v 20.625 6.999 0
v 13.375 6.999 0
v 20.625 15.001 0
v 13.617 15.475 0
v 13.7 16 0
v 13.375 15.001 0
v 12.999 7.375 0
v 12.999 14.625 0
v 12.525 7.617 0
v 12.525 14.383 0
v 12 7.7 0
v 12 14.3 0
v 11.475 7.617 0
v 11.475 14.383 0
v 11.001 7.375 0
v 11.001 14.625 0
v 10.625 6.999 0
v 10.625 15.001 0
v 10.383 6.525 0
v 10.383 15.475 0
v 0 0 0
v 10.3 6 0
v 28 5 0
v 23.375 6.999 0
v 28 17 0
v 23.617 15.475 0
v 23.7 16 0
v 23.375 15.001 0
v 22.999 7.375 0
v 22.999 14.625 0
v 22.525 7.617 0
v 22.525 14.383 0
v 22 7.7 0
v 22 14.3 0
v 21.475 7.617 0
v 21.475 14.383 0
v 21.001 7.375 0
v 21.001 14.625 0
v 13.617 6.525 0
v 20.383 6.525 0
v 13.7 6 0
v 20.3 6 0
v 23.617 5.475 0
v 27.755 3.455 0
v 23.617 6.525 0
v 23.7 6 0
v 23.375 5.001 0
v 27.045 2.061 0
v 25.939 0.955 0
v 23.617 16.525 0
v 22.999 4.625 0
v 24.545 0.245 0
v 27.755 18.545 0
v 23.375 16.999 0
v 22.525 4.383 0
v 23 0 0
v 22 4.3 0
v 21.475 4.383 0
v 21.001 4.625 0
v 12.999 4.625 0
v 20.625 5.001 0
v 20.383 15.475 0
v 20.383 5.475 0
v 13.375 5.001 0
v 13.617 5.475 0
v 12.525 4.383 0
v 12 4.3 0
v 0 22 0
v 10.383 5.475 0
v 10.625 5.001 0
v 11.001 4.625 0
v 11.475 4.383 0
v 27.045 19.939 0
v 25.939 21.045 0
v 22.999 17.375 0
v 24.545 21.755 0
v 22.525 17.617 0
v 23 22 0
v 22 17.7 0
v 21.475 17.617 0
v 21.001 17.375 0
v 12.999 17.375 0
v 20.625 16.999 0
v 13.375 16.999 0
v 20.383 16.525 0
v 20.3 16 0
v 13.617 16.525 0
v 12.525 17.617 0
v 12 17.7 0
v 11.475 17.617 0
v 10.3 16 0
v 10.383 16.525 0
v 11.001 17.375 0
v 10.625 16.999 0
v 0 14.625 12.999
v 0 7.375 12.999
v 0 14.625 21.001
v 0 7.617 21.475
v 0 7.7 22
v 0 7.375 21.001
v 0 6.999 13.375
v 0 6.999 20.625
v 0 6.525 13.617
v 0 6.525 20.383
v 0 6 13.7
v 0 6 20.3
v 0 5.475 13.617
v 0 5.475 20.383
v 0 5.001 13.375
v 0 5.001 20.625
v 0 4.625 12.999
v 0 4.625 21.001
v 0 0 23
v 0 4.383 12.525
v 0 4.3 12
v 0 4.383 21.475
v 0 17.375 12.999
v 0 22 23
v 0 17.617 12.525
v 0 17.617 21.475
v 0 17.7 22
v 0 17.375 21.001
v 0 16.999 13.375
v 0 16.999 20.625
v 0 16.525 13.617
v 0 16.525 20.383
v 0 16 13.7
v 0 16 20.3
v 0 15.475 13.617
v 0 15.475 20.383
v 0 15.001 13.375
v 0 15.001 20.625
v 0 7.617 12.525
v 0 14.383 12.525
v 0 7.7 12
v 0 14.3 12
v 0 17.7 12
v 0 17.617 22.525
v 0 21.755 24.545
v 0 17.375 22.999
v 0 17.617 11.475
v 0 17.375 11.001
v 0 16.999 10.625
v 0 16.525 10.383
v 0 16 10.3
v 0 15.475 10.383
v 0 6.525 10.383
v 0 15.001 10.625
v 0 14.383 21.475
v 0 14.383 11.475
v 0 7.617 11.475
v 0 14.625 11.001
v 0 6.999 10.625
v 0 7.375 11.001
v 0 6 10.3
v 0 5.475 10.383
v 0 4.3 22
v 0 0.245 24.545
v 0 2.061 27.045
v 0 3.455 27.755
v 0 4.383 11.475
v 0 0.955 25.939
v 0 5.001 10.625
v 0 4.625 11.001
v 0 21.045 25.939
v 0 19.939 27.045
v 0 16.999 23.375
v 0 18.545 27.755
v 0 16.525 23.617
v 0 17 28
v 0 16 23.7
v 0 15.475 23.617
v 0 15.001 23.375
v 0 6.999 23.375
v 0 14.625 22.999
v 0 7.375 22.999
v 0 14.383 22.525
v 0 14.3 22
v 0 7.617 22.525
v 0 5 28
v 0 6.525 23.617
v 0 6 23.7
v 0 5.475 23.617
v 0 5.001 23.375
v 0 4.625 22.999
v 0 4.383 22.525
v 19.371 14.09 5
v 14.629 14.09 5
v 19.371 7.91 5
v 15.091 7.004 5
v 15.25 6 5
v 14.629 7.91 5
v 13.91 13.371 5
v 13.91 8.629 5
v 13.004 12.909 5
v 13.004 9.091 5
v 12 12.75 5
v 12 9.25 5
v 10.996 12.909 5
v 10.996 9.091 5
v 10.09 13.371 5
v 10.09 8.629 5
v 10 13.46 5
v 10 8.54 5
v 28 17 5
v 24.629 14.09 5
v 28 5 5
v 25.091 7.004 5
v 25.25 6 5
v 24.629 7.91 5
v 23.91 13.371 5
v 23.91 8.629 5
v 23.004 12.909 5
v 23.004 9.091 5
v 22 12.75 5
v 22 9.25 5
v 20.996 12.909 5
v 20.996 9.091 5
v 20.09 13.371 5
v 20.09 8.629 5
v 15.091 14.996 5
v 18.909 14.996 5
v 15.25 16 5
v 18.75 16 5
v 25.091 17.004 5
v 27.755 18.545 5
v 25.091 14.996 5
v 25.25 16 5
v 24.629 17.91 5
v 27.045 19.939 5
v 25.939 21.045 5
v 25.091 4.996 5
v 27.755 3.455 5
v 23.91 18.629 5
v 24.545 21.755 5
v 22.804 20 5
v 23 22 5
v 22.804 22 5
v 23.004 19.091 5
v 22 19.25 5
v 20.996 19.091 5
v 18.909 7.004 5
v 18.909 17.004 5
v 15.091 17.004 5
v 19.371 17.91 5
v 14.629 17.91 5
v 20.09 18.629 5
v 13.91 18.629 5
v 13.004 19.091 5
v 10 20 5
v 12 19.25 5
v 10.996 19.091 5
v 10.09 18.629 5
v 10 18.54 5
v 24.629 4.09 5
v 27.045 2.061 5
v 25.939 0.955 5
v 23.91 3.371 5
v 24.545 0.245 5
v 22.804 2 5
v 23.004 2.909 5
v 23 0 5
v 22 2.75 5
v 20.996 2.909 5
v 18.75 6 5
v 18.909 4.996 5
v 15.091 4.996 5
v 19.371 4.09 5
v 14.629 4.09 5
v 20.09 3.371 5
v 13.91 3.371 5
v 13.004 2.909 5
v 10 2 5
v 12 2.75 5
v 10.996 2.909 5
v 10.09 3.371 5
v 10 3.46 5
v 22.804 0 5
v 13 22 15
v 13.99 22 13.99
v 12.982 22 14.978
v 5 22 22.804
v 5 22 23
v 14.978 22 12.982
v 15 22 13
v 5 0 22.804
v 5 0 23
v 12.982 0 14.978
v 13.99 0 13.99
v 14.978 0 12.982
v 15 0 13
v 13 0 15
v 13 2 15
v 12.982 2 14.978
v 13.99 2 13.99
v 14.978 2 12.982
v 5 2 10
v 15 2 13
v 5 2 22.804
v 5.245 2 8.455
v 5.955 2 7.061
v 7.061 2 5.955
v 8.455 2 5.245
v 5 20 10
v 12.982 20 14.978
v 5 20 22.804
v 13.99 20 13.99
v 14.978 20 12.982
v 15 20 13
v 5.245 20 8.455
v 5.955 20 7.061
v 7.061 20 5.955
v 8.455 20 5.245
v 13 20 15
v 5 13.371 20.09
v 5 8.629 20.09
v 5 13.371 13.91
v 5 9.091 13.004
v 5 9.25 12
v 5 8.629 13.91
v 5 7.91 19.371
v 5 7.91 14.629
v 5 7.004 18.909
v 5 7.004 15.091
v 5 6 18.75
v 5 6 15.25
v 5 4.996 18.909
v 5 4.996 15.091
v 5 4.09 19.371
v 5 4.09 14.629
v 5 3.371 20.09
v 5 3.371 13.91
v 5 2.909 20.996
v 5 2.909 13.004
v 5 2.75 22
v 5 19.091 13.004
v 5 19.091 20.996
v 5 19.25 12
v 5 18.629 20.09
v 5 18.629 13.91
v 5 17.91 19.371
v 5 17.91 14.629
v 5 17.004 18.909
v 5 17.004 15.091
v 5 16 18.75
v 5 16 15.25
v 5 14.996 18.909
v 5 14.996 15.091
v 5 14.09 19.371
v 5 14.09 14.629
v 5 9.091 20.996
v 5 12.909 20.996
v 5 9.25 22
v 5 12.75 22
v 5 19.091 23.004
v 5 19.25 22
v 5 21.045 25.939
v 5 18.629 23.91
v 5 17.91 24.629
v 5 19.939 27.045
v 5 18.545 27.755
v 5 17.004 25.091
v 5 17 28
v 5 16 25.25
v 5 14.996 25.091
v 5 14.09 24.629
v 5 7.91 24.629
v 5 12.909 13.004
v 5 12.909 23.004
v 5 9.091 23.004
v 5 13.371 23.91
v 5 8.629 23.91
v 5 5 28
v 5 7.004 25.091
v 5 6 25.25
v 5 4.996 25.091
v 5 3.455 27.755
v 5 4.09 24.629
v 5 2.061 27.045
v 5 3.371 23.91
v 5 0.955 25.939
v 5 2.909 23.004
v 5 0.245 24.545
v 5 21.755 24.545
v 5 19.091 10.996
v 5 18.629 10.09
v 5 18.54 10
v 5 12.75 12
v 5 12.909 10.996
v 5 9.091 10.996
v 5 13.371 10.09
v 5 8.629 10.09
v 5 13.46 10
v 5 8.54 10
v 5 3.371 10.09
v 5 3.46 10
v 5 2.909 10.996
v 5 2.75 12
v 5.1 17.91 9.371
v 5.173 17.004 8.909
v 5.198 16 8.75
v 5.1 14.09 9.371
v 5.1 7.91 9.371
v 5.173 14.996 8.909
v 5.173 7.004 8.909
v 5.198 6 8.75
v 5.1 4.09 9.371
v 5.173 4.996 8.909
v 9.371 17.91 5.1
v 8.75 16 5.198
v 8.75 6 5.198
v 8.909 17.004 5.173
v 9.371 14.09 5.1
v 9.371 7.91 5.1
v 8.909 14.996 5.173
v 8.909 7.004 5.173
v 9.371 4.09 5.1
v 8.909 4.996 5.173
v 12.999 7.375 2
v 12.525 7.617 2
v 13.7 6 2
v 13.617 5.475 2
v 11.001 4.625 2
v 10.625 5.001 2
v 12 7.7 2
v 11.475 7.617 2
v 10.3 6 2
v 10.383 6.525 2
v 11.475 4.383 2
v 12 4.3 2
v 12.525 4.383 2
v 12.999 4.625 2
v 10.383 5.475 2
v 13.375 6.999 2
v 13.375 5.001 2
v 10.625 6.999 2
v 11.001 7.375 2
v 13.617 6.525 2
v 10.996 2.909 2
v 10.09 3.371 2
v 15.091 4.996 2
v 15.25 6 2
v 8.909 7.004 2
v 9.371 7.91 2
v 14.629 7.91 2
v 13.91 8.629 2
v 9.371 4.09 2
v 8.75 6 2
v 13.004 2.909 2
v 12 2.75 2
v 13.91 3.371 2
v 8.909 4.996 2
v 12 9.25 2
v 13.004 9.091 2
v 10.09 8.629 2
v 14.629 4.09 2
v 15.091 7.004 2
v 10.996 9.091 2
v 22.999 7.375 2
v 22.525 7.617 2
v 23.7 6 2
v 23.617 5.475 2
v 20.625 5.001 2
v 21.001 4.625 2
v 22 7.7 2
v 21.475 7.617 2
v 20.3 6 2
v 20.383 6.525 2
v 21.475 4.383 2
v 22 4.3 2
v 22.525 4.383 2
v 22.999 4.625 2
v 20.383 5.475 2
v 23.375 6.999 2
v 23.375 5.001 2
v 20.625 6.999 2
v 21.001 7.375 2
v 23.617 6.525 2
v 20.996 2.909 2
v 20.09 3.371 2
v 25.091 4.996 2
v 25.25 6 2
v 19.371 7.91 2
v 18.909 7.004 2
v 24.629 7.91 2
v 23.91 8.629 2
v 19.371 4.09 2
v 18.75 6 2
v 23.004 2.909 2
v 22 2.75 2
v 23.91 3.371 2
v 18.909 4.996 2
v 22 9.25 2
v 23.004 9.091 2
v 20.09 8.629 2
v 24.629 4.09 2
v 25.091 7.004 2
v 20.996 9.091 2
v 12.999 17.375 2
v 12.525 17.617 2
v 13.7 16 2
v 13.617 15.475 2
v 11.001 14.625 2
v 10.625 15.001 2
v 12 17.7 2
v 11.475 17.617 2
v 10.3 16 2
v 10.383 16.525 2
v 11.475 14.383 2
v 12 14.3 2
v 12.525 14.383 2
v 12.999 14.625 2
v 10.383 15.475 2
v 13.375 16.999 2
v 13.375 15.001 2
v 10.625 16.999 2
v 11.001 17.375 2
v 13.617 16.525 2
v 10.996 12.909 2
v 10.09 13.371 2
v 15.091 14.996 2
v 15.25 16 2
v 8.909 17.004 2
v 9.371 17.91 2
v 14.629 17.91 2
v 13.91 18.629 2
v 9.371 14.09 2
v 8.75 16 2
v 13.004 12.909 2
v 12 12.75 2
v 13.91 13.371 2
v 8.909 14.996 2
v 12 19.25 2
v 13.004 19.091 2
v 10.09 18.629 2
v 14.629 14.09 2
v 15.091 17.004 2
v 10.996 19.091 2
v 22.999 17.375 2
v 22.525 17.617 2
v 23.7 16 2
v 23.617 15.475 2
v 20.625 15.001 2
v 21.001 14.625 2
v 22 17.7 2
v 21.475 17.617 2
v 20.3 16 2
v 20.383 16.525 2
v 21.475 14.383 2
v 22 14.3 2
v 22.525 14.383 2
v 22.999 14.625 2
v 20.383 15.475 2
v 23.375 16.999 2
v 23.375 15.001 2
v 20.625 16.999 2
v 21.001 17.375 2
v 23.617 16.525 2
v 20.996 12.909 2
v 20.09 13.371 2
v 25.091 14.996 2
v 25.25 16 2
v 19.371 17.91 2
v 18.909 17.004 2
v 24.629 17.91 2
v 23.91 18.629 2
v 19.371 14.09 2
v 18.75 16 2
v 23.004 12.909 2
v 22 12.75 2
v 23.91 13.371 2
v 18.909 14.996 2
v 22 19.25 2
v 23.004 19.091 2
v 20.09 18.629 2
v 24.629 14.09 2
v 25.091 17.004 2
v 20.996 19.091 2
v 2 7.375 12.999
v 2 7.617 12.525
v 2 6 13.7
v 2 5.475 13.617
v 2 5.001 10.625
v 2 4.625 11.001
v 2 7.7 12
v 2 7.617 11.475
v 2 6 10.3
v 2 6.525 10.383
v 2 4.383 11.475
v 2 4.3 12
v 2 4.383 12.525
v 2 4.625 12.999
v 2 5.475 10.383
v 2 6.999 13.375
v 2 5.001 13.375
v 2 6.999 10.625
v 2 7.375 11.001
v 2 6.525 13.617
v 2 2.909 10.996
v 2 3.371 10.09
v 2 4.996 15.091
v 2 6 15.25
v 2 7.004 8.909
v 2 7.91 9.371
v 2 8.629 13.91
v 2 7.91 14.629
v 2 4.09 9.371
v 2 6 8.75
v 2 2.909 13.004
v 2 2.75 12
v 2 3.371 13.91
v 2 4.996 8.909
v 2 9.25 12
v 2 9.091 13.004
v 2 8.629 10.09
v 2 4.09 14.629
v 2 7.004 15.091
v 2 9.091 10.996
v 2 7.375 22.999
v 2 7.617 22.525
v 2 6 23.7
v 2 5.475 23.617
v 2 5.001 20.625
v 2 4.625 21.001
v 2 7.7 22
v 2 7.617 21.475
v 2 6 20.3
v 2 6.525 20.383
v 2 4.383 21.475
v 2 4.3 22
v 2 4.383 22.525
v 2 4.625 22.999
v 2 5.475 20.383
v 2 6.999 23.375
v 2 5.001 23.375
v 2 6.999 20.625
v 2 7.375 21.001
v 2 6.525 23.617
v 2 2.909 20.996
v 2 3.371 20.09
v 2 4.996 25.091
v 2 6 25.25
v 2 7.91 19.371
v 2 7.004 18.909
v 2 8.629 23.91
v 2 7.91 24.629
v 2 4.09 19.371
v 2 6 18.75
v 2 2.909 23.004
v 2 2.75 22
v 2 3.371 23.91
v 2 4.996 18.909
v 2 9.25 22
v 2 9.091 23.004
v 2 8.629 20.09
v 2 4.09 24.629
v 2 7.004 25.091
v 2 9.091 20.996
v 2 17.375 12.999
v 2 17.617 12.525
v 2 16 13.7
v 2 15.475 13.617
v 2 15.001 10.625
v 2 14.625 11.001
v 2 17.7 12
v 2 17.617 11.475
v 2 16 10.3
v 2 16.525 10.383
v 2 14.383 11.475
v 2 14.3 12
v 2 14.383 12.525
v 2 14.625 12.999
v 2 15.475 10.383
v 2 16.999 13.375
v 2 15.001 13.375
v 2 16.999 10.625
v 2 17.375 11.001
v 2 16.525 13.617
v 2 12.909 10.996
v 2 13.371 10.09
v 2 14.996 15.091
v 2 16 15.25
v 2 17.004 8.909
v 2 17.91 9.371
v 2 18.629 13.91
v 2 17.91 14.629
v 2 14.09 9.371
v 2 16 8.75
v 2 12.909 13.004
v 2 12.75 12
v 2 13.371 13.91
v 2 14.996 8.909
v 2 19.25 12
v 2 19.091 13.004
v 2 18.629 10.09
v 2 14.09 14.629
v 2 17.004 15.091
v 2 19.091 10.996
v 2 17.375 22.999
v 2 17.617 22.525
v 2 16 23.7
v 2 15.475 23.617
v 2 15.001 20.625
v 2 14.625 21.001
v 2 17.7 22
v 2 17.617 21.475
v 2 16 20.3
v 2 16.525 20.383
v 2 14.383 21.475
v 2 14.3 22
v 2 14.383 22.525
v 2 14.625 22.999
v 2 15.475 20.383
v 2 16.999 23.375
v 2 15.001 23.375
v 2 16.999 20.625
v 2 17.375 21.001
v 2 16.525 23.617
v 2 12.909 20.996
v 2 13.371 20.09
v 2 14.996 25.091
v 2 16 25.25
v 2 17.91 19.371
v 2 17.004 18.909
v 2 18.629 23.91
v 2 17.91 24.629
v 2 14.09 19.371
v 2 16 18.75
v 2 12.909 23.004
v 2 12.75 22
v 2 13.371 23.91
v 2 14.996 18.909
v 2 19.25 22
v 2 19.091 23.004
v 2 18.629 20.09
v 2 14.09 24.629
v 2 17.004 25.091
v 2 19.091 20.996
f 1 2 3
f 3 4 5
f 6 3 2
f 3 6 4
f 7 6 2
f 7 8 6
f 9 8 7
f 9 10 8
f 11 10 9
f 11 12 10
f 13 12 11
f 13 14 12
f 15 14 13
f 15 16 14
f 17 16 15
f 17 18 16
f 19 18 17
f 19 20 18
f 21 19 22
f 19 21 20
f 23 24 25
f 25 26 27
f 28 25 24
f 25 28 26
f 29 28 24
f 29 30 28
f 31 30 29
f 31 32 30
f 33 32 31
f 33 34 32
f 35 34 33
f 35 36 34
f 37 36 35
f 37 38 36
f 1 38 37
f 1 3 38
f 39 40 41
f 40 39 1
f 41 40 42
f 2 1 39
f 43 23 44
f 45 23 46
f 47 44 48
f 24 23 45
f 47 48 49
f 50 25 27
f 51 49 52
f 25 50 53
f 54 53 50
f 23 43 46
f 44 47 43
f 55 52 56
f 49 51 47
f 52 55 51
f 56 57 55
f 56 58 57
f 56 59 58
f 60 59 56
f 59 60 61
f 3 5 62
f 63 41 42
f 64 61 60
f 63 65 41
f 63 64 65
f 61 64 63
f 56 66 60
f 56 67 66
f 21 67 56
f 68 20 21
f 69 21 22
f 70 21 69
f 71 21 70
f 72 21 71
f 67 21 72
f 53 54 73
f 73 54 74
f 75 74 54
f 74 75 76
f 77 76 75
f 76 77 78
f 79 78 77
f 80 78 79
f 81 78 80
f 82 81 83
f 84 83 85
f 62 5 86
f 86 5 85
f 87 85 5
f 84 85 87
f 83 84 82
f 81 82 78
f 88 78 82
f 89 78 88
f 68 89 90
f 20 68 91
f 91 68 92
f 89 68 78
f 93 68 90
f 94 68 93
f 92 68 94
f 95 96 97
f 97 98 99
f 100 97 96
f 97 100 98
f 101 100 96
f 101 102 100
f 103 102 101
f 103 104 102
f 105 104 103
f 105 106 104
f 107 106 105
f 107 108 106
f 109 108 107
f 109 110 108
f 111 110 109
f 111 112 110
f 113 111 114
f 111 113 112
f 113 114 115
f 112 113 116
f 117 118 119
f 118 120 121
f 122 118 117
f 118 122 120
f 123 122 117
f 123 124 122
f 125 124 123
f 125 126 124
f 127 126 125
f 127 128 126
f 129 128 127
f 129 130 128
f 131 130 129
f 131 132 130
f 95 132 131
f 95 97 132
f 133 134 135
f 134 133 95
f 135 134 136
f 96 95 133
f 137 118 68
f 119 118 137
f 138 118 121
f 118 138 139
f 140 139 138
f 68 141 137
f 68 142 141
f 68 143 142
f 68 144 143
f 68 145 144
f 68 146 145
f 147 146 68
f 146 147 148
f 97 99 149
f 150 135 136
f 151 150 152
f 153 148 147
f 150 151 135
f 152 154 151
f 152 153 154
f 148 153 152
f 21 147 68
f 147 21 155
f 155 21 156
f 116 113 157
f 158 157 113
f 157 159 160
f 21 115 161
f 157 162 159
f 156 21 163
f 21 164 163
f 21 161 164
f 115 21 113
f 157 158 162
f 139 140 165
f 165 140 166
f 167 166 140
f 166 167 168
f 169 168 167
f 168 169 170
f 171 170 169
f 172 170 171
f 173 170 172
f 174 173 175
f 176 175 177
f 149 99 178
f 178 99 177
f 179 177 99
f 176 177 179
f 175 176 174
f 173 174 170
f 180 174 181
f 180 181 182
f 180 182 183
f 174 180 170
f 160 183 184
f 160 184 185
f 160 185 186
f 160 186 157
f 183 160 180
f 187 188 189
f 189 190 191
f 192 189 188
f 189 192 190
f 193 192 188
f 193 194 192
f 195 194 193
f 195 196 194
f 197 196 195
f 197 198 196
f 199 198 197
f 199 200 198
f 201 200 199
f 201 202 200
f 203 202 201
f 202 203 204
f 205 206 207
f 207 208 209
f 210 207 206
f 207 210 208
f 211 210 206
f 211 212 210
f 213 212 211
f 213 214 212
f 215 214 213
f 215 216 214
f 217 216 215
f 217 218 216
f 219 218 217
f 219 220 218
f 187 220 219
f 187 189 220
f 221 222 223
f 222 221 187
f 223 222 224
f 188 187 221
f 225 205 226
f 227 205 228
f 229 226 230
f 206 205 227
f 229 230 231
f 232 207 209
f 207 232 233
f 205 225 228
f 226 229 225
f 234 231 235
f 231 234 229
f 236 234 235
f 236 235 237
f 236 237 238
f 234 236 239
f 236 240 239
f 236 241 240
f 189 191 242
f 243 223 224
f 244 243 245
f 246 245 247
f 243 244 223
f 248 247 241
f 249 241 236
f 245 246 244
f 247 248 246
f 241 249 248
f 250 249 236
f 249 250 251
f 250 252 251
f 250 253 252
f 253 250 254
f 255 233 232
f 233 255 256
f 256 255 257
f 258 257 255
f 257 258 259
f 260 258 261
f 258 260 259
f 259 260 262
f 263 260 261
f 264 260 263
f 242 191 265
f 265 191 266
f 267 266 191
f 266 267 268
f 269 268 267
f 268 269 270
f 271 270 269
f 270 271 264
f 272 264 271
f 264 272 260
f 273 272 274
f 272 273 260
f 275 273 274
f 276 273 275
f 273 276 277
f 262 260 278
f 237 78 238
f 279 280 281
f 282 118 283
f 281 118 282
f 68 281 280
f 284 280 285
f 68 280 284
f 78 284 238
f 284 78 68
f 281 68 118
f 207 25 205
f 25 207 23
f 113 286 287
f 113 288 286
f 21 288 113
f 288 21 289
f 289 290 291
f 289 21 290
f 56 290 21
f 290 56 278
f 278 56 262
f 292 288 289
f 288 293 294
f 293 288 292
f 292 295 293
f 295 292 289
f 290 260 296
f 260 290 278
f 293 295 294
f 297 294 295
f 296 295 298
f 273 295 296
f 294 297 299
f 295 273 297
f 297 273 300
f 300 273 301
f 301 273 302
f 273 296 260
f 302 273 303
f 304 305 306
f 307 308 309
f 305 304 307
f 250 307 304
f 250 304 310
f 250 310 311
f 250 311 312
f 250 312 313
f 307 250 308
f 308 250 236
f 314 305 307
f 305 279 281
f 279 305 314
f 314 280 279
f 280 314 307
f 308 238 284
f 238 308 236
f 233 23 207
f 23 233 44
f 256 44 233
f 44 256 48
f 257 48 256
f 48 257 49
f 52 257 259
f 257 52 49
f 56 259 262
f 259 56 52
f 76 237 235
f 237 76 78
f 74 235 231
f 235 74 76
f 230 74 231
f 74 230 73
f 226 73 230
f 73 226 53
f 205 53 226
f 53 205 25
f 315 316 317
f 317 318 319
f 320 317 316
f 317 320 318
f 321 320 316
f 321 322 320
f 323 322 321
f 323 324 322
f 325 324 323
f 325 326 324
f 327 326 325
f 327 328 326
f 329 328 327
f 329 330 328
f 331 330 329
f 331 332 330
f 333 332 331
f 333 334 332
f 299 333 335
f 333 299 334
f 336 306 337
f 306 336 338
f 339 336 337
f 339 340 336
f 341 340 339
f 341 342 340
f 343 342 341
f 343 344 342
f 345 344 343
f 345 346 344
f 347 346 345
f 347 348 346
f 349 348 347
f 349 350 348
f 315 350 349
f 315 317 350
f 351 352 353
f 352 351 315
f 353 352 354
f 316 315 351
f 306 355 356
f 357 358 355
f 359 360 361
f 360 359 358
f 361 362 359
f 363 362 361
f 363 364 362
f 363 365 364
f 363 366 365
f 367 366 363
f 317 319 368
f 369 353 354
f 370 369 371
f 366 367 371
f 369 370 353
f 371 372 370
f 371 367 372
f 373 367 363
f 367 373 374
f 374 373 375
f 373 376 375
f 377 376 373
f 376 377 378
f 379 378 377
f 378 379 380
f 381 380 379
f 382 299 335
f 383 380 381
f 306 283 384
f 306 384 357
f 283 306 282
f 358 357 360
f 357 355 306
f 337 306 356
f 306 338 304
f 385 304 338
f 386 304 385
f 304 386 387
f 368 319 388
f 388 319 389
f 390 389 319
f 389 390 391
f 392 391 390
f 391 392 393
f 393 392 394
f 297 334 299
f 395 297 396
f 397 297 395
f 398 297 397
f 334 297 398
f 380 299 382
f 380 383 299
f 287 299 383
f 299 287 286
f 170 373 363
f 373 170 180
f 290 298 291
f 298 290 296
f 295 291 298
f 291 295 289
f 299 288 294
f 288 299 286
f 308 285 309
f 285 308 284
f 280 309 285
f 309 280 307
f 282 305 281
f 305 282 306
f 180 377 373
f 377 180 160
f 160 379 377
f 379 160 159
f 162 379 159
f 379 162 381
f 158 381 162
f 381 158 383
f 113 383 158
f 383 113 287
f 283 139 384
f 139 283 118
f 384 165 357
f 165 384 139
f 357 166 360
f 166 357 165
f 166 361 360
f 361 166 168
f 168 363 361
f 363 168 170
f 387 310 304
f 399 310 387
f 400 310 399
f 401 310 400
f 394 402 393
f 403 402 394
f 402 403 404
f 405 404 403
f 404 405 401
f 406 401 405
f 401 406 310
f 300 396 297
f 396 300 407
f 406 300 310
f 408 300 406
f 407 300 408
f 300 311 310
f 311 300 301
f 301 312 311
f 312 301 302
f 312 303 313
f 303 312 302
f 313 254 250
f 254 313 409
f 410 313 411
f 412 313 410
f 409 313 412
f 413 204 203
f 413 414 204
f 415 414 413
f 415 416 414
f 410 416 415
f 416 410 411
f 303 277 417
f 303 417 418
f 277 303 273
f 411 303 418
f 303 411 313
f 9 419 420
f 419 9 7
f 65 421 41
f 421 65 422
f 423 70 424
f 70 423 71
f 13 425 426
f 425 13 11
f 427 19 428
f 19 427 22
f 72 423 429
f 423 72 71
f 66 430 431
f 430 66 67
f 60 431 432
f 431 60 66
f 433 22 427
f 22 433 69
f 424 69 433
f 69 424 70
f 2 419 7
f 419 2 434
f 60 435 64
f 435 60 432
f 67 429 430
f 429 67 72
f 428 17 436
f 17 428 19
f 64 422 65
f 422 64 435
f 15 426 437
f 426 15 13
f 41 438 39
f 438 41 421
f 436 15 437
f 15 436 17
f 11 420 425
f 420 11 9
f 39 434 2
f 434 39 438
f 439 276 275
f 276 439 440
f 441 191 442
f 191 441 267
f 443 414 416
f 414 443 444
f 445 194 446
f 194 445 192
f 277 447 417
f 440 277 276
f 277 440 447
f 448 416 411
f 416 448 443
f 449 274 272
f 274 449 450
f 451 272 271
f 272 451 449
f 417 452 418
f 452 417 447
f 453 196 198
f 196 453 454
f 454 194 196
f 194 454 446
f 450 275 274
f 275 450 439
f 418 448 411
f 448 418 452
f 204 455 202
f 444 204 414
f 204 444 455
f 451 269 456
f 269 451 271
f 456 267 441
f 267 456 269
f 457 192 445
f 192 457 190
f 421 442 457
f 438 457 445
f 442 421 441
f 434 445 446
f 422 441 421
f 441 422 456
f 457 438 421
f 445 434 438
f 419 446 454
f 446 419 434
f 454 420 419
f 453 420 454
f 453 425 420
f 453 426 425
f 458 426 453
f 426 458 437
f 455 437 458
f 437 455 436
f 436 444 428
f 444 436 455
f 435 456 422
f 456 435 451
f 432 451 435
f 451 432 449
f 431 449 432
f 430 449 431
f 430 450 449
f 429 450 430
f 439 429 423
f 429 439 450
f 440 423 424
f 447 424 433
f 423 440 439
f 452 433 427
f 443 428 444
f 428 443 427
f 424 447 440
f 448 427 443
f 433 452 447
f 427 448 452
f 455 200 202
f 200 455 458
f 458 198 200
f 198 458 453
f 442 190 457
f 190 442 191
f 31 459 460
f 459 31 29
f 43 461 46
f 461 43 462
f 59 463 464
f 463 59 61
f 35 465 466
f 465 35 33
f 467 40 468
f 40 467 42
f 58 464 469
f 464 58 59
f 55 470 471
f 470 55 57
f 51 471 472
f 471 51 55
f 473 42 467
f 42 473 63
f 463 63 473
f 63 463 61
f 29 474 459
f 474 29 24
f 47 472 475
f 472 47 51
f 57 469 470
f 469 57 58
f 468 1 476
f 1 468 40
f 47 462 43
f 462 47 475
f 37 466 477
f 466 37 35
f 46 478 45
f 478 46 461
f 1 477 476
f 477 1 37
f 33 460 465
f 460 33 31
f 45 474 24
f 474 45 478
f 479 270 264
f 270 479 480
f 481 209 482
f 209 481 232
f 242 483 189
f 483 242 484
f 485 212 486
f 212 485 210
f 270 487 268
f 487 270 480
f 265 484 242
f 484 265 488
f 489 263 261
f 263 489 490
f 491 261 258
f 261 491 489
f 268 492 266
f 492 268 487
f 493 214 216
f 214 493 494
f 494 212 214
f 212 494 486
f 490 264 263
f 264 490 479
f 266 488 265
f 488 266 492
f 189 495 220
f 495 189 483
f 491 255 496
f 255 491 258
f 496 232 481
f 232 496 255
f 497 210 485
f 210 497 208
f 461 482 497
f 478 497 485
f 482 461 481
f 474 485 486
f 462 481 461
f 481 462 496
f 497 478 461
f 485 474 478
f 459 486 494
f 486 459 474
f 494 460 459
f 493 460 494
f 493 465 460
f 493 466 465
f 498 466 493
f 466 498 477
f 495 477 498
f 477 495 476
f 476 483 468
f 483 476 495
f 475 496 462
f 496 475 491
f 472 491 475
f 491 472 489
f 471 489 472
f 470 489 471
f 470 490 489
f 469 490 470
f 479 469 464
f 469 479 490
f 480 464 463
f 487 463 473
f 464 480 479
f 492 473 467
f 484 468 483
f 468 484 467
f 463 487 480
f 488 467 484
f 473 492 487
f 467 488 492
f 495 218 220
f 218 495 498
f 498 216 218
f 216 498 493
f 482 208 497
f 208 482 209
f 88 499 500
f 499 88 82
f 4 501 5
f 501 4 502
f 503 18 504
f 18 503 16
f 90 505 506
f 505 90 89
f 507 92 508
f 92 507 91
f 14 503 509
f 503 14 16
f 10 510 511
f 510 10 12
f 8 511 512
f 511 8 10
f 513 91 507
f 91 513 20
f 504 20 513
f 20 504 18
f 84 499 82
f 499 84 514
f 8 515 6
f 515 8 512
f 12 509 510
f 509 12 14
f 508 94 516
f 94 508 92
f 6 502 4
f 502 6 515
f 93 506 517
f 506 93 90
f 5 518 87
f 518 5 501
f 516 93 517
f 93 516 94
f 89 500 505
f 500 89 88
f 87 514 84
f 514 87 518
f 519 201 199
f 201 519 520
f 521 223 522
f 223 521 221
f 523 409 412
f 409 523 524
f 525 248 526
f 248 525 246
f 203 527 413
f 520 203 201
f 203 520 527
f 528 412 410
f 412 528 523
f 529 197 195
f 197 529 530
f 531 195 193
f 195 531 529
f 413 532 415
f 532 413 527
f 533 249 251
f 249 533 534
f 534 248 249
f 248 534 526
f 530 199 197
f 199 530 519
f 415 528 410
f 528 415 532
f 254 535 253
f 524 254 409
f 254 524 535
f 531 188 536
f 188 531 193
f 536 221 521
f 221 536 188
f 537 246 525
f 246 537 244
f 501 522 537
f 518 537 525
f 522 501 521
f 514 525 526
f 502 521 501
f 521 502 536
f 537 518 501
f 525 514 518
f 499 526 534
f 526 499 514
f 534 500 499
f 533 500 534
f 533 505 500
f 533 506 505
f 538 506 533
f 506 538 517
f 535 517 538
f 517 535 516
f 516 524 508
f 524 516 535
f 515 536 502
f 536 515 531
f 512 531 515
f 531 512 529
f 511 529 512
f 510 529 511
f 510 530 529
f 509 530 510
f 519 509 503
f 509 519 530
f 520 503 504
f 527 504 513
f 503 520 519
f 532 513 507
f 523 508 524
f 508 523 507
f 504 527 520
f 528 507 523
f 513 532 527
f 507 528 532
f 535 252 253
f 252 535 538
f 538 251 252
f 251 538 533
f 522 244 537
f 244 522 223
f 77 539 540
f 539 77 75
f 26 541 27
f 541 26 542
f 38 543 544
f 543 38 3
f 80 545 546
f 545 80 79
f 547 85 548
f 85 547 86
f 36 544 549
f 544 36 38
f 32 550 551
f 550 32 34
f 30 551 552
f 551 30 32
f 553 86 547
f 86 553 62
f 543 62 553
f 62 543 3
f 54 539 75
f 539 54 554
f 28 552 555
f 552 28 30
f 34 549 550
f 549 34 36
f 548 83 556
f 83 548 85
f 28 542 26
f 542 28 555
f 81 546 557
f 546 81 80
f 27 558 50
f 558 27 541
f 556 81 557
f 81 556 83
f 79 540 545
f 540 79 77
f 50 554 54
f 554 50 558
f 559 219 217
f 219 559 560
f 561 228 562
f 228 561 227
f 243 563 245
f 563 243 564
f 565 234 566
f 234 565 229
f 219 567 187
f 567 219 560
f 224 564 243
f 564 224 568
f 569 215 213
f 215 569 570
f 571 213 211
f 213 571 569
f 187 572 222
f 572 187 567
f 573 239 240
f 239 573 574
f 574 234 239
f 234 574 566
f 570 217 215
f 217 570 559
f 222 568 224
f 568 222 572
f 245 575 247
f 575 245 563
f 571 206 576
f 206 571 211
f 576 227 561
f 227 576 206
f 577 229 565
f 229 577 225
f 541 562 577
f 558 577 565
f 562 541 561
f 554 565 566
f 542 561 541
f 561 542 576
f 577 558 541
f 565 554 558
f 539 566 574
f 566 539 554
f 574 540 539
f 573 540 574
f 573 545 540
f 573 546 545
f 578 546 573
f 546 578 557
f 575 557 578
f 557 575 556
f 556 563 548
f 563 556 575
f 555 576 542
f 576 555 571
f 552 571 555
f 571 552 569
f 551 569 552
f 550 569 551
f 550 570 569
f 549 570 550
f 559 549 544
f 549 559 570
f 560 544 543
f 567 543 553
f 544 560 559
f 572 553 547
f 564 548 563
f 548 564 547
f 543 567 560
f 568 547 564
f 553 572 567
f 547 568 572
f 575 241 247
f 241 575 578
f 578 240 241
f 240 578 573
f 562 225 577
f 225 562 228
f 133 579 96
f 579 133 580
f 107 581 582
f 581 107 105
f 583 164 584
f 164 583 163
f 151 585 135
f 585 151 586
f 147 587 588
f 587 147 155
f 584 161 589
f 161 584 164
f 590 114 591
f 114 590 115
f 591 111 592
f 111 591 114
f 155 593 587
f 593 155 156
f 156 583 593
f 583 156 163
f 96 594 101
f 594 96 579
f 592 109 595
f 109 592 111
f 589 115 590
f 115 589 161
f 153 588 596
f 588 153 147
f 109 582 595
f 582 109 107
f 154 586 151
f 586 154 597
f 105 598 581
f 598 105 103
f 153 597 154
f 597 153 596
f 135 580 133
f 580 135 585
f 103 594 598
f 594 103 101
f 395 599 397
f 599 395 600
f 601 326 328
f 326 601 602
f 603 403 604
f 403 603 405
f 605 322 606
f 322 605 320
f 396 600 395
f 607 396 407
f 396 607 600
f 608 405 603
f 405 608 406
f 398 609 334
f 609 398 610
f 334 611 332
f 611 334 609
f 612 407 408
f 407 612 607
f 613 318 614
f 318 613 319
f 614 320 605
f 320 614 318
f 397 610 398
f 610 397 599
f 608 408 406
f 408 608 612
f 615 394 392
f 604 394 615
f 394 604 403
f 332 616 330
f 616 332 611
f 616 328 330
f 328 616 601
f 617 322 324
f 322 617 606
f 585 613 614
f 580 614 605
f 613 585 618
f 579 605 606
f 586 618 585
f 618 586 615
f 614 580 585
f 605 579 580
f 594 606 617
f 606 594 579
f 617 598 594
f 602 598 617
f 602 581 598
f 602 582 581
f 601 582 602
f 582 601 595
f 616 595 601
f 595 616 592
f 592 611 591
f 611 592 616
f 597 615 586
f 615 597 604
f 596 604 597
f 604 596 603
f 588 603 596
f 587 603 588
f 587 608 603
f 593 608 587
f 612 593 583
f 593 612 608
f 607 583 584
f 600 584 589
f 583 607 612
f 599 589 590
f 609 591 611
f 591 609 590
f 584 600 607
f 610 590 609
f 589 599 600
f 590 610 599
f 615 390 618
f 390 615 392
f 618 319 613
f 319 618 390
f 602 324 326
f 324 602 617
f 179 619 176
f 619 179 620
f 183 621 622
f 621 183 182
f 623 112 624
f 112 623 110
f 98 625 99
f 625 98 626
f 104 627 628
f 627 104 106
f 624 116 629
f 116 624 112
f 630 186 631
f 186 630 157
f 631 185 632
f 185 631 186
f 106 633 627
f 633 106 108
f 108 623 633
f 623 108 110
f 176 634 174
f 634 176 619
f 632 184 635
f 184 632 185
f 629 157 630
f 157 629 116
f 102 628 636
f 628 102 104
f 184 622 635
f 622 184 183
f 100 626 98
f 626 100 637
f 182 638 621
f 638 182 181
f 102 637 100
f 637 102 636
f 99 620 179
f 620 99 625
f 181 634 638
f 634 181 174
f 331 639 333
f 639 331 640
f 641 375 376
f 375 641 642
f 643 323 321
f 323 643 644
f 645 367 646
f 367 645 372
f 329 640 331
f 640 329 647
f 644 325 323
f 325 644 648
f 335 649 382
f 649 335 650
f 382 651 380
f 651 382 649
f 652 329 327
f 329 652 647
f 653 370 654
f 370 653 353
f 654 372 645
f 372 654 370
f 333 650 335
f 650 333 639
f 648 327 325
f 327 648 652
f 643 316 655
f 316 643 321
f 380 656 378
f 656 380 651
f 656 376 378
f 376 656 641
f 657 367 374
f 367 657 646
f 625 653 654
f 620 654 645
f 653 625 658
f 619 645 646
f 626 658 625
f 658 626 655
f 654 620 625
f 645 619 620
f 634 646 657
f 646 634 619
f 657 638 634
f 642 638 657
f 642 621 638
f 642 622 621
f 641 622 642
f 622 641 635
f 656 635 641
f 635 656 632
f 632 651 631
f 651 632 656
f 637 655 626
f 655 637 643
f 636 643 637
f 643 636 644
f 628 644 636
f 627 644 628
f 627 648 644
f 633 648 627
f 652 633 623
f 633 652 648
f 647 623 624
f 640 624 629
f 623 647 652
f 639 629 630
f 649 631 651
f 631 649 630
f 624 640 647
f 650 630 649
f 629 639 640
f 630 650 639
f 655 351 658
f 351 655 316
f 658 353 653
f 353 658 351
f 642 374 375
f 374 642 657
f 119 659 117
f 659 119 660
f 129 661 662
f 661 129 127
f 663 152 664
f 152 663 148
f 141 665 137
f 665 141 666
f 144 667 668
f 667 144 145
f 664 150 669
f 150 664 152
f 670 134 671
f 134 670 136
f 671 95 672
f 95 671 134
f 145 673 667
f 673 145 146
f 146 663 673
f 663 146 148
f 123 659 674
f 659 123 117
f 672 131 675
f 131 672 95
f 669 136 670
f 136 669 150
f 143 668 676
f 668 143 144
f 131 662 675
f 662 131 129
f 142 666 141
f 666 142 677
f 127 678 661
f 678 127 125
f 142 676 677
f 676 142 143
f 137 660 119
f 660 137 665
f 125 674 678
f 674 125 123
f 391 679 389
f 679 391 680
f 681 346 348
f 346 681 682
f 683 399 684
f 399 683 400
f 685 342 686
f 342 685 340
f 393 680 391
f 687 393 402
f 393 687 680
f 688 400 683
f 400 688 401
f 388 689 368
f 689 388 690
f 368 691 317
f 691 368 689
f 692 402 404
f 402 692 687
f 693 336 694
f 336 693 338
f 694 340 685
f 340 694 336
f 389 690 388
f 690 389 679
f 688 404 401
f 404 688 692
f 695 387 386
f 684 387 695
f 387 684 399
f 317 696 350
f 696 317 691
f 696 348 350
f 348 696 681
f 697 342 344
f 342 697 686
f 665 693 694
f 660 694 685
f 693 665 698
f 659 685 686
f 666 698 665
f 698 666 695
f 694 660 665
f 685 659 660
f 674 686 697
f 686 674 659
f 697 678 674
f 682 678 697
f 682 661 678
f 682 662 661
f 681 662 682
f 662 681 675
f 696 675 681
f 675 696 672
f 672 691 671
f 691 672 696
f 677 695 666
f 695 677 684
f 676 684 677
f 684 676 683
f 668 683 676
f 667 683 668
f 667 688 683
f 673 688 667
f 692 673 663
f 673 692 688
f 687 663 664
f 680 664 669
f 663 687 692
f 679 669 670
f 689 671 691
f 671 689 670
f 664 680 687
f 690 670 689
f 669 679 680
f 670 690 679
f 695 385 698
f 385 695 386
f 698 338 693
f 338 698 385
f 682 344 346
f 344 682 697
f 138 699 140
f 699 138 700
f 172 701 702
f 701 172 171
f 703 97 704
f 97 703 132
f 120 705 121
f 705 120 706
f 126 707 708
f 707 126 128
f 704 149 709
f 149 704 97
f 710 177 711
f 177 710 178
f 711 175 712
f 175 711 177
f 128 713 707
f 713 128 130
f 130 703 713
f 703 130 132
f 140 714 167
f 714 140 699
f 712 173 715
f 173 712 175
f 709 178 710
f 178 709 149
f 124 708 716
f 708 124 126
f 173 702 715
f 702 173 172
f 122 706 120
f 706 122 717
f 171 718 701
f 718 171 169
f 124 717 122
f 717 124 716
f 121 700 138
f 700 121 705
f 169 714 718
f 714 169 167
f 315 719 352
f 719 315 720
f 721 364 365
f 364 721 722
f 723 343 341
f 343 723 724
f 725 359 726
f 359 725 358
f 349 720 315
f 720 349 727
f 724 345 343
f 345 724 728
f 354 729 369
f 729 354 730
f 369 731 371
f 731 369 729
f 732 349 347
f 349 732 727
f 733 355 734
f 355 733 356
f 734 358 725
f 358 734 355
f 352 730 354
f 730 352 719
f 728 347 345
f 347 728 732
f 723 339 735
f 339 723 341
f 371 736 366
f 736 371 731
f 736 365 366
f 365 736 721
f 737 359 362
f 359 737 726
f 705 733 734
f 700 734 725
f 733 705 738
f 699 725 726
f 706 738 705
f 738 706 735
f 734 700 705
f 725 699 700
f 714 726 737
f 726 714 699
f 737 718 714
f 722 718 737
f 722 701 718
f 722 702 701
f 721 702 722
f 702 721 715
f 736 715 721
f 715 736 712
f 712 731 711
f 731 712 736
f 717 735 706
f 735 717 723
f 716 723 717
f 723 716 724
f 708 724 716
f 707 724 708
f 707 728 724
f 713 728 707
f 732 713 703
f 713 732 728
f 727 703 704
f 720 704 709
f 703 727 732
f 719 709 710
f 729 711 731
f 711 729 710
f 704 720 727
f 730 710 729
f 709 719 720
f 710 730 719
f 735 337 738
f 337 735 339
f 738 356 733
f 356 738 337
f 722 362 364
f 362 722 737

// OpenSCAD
// Copyright 2019 jackw01. 
// https://jackw01.github.io
// Released under the Creative Commons - Attribution license.

// Screw clearance hole diameter (mm)
screwHoleDiameter = 3.4;
// Screw clearance hole counterbore diameter (mm)
screwHoleCounterboreDiameter = 6.5;
// Screw clearance hole counterbore depth (mm)
screwHoleCounterboreDepth = 3;
// Number of screw holes on side 1 (length dimension)
side1Holes = 2;
// Spacing of screw holes on side 1 (mm)
side1HoleSpacing = 10;
// Spacing between corner axis and first screw hole on side 1 (mm)
side1HoleOffset = 12;
// Number of screw holes on side 2 (length dimension)
side2Holes = 2;
// Spacing of screw holes on side 2 (mm)
side2HoleSpacing = 10;
// Spacing between corner axis and first screw hole on side 2 (mm)
side2HoleOffset = 12;
// Number of screw holes in width direction (essentially extends the bracket along the corner axis)
widthHoles = 2;
// Width of bracket (per hole on width axis) (mm)
widthHoleSpacing = 10;
// Margin around holes on width and length axes (mm)
holeMargin = 6;
// Thickness of the bracket (mm)
thickness = 5;
// Fillet radius (mm)
filletRadius = 5;
// Fillet the corner axis?
filletCornerAxis = 1; // [0:no, 1:yes]
// Fillet radius for corner axis (mm)
filletCornerAxisRadius = 5;
// Gusset on left side?
gussetLeft = 1; // [0:no, 1:yes]
// Gusset on right side?
gussetRight = 1; // [0:no, 1:yes]
// Gusset size (in both dimensions) (mm)
gussetSize = 18;
// Gusset thickness (mm)
gussetThickness = 2;
// Number of segments used to make circular shapes
circleRes = 20;

length = (side1Holes - 1) * side1HoleSpacing + side1HoleOffset + holeMargin;
width = holeMargin * 2 + widthHoleSpacing * (widthHoles - 1);

module hole() {
    union() {
        linear_extrude(height=thickness + length) {
            circle(d=screwHoleDiameter, $fn=circleRes);
        }
        translate([0, 0, thickness - screwHoleCounterboreDepth]) linear_extrude(height=screwHoleCounterboreDepth + length) {
            circle(d=screwHoleCounterboreDiameter, $fn=circleRes);
        }
    }
}

module bracketSide() {
    difference() {
        union() {
            linear_extrude(height=thickness) {
                square([length, width], center=false);
            }
            if (gussetLeft == 1) {
                rotate([-90, 0, 0]) linear_extrude(height=gussetThickness) {
                    polygon(points=[[thickness - 0.2, -thickness + 0.2], [gussetSize + thickness, -thickness + 0.2], [gussetSize / 2 + thickness - 1, -gussetSize / 2 - thickness - 1]]);
                }
            }
            if (gussetRight == 1) {
                translate([0, width - gussetThickness, 0]) rotate([-90, 0, 0]) linear_extrude(height=gussetThickness) {
                    polygon(points=[[thickness - 0.2, -thickness + 0.2], [gussetSize + thickness, -thickness + 0.2], [gussetSize / 2 + thickness - 1, -gussetSize / 2 - thickness - 1]]);
                }
            }
        }
        translate([length - filletRadius, filletRadius, 0]) rotate([0, 0, -90]) linear_extrude(height=length) {
            difference() {
                square([filletRadius * 2, filletRadius * 2], center=false);
                circle(r=filletRadius, $fn=circleRes);
            }
        }
        translate([length - filletRadius, holeMargin * 2 + widthHoleSpacing * (widthHoles - 1) - filletRadius, 0]) linear_extrude(height=length) {
            difference() {
                square([filletRadius * 2, filletRadius * 2], center=false);
                circle(r=filletRadius, $fn=circleRes);
            }
        }
    }
}

module bracketSideHoles() {
    for (x=[0:widthHoles - 1]) {
        for (y=[0:side1Holes - 1]) {
            translate([side1HoleOffset + y * side1HoleSpacing, holeMargin + x * widthHoleSpacing]) hole();
        }
    }
}

difference() {
    union() {
        bracketSide();
        rotate([0, 90, 0]) mirror([1, 0, 0]) bracketSide();
        if (filletCornerAxis == 1) {
            translate([filletCornerAxisRadius * 2, 0, filletCornerAxisRadius * 2]) rotate([0, 90, 90]) linear_extrude(height=width) {
                difference() {
                    square([filletCornerAxisRadius + 0.2, filletCornerAxisRadius + 0.2], center=false);
                    circle(r=filletCornerAxisRadius, $fn=circleRes);
                }
            }
        }
    }
    union() {
        bracketSideHoles();
        rotate([0, 90, 0]) mirror([1, 0, 0]) bracketSideHoles();
    }
}
